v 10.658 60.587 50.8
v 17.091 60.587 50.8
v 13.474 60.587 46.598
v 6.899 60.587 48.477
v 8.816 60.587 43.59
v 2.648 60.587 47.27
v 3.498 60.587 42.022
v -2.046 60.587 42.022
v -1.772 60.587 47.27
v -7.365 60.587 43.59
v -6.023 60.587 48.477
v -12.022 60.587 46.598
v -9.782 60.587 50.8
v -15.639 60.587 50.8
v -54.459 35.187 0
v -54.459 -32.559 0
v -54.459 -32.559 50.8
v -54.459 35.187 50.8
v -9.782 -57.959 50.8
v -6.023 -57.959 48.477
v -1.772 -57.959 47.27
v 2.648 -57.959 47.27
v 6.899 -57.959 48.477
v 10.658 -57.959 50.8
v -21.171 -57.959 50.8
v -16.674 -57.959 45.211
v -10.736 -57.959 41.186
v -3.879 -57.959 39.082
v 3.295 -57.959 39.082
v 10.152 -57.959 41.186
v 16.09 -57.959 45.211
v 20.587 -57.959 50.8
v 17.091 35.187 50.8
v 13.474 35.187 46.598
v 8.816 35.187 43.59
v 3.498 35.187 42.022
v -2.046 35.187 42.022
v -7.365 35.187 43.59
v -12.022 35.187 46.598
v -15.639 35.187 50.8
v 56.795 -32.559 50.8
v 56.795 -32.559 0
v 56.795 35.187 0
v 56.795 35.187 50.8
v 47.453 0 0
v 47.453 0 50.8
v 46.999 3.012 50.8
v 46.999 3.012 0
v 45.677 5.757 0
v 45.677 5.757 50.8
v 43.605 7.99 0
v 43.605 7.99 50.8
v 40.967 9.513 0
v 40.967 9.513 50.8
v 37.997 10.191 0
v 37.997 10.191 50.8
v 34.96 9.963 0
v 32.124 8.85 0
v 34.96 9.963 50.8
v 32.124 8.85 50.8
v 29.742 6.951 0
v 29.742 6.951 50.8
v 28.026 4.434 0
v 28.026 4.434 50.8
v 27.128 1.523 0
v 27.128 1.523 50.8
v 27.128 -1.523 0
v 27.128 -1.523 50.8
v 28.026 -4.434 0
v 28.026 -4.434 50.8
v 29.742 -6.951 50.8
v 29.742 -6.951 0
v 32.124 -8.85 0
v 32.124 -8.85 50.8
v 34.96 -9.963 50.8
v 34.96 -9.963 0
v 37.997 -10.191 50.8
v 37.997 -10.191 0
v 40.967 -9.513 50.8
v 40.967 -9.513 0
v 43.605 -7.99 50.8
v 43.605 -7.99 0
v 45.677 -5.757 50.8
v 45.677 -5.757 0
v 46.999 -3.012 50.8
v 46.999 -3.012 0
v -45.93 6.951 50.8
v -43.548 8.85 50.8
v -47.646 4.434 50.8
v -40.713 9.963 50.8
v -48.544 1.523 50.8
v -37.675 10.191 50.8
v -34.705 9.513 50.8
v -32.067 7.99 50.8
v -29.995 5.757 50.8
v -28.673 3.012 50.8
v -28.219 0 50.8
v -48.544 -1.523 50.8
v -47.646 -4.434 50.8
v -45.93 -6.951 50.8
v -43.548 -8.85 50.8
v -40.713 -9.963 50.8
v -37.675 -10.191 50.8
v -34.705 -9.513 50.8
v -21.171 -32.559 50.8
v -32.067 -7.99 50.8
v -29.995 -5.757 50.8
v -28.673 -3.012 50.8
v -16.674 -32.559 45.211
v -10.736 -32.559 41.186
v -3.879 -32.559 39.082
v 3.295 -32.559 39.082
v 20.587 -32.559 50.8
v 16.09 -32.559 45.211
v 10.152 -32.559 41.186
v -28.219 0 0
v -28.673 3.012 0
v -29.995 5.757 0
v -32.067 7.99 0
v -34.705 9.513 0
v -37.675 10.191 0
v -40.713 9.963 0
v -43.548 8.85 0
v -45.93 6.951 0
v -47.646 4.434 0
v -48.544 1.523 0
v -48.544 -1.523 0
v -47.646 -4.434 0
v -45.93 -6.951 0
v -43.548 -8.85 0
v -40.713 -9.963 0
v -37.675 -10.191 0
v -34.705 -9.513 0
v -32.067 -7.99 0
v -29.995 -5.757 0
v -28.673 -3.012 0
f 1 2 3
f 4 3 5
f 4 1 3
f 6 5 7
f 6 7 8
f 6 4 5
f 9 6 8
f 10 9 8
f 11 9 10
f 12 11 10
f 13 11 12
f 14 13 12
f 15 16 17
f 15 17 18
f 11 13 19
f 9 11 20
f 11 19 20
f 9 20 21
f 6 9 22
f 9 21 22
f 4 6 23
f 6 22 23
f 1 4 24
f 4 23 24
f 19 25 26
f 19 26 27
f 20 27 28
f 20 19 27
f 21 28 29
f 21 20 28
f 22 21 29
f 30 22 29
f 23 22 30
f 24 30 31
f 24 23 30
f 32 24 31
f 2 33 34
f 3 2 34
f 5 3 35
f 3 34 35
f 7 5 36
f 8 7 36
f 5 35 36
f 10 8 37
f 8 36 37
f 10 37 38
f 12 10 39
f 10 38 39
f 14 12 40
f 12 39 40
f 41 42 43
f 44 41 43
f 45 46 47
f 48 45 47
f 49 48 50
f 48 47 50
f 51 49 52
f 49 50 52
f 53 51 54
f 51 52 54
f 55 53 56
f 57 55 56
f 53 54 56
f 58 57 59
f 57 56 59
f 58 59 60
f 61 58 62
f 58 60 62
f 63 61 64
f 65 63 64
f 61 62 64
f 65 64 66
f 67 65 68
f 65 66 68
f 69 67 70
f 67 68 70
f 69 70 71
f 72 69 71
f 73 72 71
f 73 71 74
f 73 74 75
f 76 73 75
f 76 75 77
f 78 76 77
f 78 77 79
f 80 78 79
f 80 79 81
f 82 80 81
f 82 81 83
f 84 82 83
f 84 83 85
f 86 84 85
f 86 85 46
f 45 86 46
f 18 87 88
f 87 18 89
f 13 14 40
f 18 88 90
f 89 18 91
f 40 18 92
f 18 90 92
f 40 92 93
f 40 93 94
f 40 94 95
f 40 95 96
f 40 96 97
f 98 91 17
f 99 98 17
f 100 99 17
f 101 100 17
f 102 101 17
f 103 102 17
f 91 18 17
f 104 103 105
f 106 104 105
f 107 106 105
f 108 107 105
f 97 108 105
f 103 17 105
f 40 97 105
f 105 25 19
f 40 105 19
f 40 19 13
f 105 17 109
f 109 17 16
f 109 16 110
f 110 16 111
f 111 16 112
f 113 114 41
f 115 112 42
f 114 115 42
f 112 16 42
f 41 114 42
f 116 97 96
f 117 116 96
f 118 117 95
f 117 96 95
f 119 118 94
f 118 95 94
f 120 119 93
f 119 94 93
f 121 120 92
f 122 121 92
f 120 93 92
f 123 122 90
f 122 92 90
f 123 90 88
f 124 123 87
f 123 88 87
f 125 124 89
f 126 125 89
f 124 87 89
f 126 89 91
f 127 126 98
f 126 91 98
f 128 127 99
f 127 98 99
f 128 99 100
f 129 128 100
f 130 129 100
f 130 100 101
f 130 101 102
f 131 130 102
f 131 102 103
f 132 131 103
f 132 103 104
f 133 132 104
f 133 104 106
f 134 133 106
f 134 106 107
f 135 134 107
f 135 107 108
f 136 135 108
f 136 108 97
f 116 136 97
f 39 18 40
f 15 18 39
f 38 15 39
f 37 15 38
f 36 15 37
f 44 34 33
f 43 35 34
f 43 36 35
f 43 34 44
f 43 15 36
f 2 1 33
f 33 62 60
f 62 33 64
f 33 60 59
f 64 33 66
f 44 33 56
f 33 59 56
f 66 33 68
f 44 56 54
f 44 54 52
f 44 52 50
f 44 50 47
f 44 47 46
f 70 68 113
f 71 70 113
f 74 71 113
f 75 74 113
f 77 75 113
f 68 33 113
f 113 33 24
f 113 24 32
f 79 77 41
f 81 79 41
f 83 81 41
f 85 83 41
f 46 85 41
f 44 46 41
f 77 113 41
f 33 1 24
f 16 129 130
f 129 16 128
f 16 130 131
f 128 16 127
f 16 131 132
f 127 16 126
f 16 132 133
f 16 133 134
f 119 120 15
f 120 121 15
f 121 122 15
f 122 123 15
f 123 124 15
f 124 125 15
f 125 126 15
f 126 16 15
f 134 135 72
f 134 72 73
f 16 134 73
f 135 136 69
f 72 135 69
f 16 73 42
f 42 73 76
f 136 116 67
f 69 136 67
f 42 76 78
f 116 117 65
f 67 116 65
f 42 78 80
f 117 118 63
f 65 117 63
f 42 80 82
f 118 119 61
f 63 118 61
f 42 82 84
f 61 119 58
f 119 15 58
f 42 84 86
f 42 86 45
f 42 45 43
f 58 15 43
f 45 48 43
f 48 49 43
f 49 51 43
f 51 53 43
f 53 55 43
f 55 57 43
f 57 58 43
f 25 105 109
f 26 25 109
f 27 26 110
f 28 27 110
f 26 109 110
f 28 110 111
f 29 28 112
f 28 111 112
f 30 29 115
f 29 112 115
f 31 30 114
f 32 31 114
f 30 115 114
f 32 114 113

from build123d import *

# Parameters (mm, degrees)
F0_W     = 111.2547814846
F0_H     = 67.745693028
F1_DEPTH = 50.8
F3_DEPTH = 127
F4_DEPTH = 25.4
F6_DEPTH = 25.4
F7_R     = 10.2195358779
F8_DEPTH = 127


with BuildPart() as f1:
    # F0 (on Top) → F1 (new body)
    with BuildSketch(Plane.XY):
        with Locations((1.1680275202, 1.3140328228)):
            Rectangle(F0_W, F0_H)
    extrude(amount=F1_DEPTH)

    # F2 (on face) → F3 (cut)
    with BuildSketch(Plane.XZ.offset(32.5588136911)):
        with BuildLine():
            Line((10.6582669541, 50.8), (-9.7822453827, 50.8))
            ThreePointArc((-9.7822453827, 50.8), (0.4380107857, 47.116543464), (10.6582669541, 50.8))
        make_face()
    extrude(amount=-F3_DEPTH, mode=Mode.SUBTRACT)

    # F2 (on face) → F4 (join)
    with BuildSketch(Plane.XZ.offset(32.5588136911)):
        with BuildLine():
            ThreePointArc((10.6582669541, 50.8), (0.4380107857, 47.116543464), (-9.7822453827, 50.8))
            Line((-9.7822453827, 50.8), (-21.1705304682, 50.8))
            ThreePointArc((-21.1705304682, 50.8), (-0.2920087427, 38.8142078712), (20.5865129828, 50.8))
            Line((20.5865129828, 50.8), (10.6582669541, 50.8))
        make_face()
    extrude(amount=F4_DEPTH)

    # F5 (on face) → F6 (join)
    with BuildSketch(Plane(origin=(0, 35.1868793368, 0), x_dir=(-1, 0, 0), z_dir=(0, 1, 0))):
        with BuildLine():
            Line((-10.6582669541, 50.8), (-17.0911587775, 50.8))
            ThreePointArc((-17.0911587775, 50.8), (-0.7258458063, 41.8226759797), (15.6394671649, 50.8))
            Line((15.6394671649, 50.8), (9.7822453827, 50.8))
            ThreePointArc((9.7822453827, 50.8), (-0.4380107857, 47.116543464), (-10.6582669541, 50.8))
        make_face()
    extrude(amount=F6_DEPTH)

    # F7 (on face) → F8 (cut)
    with BuildSketch(Plane.XY.offset(50.8)):
        with Locations((-38.438539952, 0)):
            Circle(F7_R)
        with Locations((37.2335724533, 0)):
            Circle(F7_R)
    extrude(amount=-F8_DEPTH, mode=Mode.SUBTRACT)


solid = f1.part
